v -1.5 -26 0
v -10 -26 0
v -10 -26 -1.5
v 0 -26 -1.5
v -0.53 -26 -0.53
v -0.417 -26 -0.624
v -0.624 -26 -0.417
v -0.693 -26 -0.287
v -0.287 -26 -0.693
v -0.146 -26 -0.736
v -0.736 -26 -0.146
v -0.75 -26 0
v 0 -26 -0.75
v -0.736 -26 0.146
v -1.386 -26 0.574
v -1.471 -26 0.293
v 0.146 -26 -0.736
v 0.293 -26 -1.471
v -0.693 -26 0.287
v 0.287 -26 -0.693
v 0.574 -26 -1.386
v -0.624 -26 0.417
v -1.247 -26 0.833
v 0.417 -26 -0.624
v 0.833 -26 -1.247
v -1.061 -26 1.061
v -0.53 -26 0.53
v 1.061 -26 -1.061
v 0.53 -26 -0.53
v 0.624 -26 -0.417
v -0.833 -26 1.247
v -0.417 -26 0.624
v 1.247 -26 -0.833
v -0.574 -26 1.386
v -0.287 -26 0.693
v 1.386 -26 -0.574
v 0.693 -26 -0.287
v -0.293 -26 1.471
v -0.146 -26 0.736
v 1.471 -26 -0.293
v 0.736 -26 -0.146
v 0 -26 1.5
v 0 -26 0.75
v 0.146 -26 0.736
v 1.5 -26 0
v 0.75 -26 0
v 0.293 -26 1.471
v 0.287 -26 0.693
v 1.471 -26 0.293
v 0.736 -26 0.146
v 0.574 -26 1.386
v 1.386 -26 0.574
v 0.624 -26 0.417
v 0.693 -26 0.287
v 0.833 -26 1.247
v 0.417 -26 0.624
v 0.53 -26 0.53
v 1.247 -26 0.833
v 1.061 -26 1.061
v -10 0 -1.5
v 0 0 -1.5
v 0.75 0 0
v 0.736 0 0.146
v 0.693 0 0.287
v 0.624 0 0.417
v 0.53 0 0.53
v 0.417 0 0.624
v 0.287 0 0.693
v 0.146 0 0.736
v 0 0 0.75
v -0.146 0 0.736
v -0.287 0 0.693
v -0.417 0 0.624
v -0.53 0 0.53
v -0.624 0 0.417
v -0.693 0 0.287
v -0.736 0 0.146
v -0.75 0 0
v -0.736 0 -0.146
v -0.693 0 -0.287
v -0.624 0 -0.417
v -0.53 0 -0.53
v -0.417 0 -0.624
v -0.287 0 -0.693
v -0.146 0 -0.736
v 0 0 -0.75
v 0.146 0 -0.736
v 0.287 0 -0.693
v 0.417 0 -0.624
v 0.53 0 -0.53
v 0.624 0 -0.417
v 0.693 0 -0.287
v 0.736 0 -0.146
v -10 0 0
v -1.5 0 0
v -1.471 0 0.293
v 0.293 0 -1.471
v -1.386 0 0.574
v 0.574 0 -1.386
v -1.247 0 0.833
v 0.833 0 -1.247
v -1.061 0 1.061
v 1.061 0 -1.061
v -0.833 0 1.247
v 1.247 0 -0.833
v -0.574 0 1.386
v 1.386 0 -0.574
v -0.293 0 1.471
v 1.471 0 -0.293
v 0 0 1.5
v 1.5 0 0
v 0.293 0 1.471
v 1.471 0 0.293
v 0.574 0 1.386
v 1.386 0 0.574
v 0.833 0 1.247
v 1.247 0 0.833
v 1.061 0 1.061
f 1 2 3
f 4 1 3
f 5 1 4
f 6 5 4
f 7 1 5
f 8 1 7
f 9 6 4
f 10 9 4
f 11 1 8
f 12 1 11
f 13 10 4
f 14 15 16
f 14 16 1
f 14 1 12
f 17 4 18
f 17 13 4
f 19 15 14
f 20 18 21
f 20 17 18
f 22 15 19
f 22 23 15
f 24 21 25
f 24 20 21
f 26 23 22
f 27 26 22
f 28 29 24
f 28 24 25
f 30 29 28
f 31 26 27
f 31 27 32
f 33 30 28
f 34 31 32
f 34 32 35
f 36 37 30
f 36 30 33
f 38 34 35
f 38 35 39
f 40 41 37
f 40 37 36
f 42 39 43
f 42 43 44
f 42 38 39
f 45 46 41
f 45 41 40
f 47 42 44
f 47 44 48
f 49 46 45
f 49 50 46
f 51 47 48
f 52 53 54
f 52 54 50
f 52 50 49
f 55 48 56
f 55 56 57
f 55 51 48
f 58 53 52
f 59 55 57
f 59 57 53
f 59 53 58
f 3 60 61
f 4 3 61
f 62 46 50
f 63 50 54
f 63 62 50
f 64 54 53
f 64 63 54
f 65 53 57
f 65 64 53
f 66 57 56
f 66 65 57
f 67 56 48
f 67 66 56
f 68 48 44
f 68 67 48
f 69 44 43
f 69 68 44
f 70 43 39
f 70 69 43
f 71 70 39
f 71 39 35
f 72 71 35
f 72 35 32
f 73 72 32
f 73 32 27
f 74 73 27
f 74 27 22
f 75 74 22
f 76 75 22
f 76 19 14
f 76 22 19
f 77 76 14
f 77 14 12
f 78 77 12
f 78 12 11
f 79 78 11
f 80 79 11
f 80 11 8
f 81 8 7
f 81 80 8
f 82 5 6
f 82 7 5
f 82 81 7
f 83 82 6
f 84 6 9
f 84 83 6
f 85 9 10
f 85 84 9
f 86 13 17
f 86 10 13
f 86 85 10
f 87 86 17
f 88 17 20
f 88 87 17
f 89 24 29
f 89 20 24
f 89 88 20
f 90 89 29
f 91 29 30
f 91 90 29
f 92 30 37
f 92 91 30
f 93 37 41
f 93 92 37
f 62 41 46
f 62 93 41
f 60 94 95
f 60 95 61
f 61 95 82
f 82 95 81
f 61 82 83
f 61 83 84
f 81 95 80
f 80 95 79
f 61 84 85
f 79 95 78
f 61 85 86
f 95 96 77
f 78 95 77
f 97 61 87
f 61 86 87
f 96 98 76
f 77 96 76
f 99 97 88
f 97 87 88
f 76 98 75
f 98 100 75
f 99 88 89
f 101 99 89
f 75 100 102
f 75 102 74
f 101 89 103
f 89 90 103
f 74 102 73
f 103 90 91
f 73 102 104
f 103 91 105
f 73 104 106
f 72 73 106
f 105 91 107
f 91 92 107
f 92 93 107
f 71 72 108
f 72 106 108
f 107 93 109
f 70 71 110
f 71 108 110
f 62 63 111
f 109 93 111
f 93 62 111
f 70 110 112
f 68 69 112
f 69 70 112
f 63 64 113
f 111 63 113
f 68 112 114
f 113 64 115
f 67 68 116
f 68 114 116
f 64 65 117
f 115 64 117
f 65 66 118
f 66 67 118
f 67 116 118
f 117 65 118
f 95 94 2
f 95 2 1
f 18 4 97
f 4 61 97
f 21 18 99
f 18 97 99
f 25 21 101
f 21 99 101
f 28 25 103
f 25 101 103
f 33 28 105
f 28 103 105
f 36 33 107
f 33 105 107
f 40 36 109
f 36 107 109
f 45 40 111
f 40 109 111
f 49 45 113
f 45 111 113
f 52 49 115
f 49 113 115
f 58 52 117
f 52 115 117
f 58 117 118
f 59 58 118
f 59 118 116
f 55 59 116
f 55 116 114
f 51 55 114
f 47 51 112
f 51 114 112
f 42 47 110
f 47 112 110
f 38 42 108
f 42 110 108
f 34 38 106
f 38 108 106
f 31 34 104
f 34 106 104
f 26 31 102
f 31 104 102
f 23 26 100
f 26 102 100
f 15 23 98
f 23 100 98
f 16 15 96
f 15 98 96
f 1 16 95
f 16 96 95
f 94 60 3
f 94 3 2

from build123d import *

# Parameters (mm, degrees)
F0_R     = 1.5
F1_DEPTH = 26
F2_W     = 10
F2_H     = 1.5
F3_DEPTH = 26
F4_R     = 0.75
F5_DEPTH = 28.9


with BuildPart() as f1:
    # F0 (on Front) → F1 (new body)
    with BuildSketch(Plane.XZ):
        Circle(F0_R)
    extrude(amount=F1_DEPTH)

    # F2 (on Front) → F3 (join)
    with BuildSketch(Plane.XZ):
        with Locations((-5, -0.75)):
            Rectangle(F2_W, F2_H)
    extrude(amount=F3_DEPTH)

    # F4 (on Front) → F5 (cut)
    with BuildSketch(Plane.XZ):
        Circle(F4_R)
    extrude(amount=F5_DEPTH, mode=Mode.SUBTRACT)


solid = f1.part
